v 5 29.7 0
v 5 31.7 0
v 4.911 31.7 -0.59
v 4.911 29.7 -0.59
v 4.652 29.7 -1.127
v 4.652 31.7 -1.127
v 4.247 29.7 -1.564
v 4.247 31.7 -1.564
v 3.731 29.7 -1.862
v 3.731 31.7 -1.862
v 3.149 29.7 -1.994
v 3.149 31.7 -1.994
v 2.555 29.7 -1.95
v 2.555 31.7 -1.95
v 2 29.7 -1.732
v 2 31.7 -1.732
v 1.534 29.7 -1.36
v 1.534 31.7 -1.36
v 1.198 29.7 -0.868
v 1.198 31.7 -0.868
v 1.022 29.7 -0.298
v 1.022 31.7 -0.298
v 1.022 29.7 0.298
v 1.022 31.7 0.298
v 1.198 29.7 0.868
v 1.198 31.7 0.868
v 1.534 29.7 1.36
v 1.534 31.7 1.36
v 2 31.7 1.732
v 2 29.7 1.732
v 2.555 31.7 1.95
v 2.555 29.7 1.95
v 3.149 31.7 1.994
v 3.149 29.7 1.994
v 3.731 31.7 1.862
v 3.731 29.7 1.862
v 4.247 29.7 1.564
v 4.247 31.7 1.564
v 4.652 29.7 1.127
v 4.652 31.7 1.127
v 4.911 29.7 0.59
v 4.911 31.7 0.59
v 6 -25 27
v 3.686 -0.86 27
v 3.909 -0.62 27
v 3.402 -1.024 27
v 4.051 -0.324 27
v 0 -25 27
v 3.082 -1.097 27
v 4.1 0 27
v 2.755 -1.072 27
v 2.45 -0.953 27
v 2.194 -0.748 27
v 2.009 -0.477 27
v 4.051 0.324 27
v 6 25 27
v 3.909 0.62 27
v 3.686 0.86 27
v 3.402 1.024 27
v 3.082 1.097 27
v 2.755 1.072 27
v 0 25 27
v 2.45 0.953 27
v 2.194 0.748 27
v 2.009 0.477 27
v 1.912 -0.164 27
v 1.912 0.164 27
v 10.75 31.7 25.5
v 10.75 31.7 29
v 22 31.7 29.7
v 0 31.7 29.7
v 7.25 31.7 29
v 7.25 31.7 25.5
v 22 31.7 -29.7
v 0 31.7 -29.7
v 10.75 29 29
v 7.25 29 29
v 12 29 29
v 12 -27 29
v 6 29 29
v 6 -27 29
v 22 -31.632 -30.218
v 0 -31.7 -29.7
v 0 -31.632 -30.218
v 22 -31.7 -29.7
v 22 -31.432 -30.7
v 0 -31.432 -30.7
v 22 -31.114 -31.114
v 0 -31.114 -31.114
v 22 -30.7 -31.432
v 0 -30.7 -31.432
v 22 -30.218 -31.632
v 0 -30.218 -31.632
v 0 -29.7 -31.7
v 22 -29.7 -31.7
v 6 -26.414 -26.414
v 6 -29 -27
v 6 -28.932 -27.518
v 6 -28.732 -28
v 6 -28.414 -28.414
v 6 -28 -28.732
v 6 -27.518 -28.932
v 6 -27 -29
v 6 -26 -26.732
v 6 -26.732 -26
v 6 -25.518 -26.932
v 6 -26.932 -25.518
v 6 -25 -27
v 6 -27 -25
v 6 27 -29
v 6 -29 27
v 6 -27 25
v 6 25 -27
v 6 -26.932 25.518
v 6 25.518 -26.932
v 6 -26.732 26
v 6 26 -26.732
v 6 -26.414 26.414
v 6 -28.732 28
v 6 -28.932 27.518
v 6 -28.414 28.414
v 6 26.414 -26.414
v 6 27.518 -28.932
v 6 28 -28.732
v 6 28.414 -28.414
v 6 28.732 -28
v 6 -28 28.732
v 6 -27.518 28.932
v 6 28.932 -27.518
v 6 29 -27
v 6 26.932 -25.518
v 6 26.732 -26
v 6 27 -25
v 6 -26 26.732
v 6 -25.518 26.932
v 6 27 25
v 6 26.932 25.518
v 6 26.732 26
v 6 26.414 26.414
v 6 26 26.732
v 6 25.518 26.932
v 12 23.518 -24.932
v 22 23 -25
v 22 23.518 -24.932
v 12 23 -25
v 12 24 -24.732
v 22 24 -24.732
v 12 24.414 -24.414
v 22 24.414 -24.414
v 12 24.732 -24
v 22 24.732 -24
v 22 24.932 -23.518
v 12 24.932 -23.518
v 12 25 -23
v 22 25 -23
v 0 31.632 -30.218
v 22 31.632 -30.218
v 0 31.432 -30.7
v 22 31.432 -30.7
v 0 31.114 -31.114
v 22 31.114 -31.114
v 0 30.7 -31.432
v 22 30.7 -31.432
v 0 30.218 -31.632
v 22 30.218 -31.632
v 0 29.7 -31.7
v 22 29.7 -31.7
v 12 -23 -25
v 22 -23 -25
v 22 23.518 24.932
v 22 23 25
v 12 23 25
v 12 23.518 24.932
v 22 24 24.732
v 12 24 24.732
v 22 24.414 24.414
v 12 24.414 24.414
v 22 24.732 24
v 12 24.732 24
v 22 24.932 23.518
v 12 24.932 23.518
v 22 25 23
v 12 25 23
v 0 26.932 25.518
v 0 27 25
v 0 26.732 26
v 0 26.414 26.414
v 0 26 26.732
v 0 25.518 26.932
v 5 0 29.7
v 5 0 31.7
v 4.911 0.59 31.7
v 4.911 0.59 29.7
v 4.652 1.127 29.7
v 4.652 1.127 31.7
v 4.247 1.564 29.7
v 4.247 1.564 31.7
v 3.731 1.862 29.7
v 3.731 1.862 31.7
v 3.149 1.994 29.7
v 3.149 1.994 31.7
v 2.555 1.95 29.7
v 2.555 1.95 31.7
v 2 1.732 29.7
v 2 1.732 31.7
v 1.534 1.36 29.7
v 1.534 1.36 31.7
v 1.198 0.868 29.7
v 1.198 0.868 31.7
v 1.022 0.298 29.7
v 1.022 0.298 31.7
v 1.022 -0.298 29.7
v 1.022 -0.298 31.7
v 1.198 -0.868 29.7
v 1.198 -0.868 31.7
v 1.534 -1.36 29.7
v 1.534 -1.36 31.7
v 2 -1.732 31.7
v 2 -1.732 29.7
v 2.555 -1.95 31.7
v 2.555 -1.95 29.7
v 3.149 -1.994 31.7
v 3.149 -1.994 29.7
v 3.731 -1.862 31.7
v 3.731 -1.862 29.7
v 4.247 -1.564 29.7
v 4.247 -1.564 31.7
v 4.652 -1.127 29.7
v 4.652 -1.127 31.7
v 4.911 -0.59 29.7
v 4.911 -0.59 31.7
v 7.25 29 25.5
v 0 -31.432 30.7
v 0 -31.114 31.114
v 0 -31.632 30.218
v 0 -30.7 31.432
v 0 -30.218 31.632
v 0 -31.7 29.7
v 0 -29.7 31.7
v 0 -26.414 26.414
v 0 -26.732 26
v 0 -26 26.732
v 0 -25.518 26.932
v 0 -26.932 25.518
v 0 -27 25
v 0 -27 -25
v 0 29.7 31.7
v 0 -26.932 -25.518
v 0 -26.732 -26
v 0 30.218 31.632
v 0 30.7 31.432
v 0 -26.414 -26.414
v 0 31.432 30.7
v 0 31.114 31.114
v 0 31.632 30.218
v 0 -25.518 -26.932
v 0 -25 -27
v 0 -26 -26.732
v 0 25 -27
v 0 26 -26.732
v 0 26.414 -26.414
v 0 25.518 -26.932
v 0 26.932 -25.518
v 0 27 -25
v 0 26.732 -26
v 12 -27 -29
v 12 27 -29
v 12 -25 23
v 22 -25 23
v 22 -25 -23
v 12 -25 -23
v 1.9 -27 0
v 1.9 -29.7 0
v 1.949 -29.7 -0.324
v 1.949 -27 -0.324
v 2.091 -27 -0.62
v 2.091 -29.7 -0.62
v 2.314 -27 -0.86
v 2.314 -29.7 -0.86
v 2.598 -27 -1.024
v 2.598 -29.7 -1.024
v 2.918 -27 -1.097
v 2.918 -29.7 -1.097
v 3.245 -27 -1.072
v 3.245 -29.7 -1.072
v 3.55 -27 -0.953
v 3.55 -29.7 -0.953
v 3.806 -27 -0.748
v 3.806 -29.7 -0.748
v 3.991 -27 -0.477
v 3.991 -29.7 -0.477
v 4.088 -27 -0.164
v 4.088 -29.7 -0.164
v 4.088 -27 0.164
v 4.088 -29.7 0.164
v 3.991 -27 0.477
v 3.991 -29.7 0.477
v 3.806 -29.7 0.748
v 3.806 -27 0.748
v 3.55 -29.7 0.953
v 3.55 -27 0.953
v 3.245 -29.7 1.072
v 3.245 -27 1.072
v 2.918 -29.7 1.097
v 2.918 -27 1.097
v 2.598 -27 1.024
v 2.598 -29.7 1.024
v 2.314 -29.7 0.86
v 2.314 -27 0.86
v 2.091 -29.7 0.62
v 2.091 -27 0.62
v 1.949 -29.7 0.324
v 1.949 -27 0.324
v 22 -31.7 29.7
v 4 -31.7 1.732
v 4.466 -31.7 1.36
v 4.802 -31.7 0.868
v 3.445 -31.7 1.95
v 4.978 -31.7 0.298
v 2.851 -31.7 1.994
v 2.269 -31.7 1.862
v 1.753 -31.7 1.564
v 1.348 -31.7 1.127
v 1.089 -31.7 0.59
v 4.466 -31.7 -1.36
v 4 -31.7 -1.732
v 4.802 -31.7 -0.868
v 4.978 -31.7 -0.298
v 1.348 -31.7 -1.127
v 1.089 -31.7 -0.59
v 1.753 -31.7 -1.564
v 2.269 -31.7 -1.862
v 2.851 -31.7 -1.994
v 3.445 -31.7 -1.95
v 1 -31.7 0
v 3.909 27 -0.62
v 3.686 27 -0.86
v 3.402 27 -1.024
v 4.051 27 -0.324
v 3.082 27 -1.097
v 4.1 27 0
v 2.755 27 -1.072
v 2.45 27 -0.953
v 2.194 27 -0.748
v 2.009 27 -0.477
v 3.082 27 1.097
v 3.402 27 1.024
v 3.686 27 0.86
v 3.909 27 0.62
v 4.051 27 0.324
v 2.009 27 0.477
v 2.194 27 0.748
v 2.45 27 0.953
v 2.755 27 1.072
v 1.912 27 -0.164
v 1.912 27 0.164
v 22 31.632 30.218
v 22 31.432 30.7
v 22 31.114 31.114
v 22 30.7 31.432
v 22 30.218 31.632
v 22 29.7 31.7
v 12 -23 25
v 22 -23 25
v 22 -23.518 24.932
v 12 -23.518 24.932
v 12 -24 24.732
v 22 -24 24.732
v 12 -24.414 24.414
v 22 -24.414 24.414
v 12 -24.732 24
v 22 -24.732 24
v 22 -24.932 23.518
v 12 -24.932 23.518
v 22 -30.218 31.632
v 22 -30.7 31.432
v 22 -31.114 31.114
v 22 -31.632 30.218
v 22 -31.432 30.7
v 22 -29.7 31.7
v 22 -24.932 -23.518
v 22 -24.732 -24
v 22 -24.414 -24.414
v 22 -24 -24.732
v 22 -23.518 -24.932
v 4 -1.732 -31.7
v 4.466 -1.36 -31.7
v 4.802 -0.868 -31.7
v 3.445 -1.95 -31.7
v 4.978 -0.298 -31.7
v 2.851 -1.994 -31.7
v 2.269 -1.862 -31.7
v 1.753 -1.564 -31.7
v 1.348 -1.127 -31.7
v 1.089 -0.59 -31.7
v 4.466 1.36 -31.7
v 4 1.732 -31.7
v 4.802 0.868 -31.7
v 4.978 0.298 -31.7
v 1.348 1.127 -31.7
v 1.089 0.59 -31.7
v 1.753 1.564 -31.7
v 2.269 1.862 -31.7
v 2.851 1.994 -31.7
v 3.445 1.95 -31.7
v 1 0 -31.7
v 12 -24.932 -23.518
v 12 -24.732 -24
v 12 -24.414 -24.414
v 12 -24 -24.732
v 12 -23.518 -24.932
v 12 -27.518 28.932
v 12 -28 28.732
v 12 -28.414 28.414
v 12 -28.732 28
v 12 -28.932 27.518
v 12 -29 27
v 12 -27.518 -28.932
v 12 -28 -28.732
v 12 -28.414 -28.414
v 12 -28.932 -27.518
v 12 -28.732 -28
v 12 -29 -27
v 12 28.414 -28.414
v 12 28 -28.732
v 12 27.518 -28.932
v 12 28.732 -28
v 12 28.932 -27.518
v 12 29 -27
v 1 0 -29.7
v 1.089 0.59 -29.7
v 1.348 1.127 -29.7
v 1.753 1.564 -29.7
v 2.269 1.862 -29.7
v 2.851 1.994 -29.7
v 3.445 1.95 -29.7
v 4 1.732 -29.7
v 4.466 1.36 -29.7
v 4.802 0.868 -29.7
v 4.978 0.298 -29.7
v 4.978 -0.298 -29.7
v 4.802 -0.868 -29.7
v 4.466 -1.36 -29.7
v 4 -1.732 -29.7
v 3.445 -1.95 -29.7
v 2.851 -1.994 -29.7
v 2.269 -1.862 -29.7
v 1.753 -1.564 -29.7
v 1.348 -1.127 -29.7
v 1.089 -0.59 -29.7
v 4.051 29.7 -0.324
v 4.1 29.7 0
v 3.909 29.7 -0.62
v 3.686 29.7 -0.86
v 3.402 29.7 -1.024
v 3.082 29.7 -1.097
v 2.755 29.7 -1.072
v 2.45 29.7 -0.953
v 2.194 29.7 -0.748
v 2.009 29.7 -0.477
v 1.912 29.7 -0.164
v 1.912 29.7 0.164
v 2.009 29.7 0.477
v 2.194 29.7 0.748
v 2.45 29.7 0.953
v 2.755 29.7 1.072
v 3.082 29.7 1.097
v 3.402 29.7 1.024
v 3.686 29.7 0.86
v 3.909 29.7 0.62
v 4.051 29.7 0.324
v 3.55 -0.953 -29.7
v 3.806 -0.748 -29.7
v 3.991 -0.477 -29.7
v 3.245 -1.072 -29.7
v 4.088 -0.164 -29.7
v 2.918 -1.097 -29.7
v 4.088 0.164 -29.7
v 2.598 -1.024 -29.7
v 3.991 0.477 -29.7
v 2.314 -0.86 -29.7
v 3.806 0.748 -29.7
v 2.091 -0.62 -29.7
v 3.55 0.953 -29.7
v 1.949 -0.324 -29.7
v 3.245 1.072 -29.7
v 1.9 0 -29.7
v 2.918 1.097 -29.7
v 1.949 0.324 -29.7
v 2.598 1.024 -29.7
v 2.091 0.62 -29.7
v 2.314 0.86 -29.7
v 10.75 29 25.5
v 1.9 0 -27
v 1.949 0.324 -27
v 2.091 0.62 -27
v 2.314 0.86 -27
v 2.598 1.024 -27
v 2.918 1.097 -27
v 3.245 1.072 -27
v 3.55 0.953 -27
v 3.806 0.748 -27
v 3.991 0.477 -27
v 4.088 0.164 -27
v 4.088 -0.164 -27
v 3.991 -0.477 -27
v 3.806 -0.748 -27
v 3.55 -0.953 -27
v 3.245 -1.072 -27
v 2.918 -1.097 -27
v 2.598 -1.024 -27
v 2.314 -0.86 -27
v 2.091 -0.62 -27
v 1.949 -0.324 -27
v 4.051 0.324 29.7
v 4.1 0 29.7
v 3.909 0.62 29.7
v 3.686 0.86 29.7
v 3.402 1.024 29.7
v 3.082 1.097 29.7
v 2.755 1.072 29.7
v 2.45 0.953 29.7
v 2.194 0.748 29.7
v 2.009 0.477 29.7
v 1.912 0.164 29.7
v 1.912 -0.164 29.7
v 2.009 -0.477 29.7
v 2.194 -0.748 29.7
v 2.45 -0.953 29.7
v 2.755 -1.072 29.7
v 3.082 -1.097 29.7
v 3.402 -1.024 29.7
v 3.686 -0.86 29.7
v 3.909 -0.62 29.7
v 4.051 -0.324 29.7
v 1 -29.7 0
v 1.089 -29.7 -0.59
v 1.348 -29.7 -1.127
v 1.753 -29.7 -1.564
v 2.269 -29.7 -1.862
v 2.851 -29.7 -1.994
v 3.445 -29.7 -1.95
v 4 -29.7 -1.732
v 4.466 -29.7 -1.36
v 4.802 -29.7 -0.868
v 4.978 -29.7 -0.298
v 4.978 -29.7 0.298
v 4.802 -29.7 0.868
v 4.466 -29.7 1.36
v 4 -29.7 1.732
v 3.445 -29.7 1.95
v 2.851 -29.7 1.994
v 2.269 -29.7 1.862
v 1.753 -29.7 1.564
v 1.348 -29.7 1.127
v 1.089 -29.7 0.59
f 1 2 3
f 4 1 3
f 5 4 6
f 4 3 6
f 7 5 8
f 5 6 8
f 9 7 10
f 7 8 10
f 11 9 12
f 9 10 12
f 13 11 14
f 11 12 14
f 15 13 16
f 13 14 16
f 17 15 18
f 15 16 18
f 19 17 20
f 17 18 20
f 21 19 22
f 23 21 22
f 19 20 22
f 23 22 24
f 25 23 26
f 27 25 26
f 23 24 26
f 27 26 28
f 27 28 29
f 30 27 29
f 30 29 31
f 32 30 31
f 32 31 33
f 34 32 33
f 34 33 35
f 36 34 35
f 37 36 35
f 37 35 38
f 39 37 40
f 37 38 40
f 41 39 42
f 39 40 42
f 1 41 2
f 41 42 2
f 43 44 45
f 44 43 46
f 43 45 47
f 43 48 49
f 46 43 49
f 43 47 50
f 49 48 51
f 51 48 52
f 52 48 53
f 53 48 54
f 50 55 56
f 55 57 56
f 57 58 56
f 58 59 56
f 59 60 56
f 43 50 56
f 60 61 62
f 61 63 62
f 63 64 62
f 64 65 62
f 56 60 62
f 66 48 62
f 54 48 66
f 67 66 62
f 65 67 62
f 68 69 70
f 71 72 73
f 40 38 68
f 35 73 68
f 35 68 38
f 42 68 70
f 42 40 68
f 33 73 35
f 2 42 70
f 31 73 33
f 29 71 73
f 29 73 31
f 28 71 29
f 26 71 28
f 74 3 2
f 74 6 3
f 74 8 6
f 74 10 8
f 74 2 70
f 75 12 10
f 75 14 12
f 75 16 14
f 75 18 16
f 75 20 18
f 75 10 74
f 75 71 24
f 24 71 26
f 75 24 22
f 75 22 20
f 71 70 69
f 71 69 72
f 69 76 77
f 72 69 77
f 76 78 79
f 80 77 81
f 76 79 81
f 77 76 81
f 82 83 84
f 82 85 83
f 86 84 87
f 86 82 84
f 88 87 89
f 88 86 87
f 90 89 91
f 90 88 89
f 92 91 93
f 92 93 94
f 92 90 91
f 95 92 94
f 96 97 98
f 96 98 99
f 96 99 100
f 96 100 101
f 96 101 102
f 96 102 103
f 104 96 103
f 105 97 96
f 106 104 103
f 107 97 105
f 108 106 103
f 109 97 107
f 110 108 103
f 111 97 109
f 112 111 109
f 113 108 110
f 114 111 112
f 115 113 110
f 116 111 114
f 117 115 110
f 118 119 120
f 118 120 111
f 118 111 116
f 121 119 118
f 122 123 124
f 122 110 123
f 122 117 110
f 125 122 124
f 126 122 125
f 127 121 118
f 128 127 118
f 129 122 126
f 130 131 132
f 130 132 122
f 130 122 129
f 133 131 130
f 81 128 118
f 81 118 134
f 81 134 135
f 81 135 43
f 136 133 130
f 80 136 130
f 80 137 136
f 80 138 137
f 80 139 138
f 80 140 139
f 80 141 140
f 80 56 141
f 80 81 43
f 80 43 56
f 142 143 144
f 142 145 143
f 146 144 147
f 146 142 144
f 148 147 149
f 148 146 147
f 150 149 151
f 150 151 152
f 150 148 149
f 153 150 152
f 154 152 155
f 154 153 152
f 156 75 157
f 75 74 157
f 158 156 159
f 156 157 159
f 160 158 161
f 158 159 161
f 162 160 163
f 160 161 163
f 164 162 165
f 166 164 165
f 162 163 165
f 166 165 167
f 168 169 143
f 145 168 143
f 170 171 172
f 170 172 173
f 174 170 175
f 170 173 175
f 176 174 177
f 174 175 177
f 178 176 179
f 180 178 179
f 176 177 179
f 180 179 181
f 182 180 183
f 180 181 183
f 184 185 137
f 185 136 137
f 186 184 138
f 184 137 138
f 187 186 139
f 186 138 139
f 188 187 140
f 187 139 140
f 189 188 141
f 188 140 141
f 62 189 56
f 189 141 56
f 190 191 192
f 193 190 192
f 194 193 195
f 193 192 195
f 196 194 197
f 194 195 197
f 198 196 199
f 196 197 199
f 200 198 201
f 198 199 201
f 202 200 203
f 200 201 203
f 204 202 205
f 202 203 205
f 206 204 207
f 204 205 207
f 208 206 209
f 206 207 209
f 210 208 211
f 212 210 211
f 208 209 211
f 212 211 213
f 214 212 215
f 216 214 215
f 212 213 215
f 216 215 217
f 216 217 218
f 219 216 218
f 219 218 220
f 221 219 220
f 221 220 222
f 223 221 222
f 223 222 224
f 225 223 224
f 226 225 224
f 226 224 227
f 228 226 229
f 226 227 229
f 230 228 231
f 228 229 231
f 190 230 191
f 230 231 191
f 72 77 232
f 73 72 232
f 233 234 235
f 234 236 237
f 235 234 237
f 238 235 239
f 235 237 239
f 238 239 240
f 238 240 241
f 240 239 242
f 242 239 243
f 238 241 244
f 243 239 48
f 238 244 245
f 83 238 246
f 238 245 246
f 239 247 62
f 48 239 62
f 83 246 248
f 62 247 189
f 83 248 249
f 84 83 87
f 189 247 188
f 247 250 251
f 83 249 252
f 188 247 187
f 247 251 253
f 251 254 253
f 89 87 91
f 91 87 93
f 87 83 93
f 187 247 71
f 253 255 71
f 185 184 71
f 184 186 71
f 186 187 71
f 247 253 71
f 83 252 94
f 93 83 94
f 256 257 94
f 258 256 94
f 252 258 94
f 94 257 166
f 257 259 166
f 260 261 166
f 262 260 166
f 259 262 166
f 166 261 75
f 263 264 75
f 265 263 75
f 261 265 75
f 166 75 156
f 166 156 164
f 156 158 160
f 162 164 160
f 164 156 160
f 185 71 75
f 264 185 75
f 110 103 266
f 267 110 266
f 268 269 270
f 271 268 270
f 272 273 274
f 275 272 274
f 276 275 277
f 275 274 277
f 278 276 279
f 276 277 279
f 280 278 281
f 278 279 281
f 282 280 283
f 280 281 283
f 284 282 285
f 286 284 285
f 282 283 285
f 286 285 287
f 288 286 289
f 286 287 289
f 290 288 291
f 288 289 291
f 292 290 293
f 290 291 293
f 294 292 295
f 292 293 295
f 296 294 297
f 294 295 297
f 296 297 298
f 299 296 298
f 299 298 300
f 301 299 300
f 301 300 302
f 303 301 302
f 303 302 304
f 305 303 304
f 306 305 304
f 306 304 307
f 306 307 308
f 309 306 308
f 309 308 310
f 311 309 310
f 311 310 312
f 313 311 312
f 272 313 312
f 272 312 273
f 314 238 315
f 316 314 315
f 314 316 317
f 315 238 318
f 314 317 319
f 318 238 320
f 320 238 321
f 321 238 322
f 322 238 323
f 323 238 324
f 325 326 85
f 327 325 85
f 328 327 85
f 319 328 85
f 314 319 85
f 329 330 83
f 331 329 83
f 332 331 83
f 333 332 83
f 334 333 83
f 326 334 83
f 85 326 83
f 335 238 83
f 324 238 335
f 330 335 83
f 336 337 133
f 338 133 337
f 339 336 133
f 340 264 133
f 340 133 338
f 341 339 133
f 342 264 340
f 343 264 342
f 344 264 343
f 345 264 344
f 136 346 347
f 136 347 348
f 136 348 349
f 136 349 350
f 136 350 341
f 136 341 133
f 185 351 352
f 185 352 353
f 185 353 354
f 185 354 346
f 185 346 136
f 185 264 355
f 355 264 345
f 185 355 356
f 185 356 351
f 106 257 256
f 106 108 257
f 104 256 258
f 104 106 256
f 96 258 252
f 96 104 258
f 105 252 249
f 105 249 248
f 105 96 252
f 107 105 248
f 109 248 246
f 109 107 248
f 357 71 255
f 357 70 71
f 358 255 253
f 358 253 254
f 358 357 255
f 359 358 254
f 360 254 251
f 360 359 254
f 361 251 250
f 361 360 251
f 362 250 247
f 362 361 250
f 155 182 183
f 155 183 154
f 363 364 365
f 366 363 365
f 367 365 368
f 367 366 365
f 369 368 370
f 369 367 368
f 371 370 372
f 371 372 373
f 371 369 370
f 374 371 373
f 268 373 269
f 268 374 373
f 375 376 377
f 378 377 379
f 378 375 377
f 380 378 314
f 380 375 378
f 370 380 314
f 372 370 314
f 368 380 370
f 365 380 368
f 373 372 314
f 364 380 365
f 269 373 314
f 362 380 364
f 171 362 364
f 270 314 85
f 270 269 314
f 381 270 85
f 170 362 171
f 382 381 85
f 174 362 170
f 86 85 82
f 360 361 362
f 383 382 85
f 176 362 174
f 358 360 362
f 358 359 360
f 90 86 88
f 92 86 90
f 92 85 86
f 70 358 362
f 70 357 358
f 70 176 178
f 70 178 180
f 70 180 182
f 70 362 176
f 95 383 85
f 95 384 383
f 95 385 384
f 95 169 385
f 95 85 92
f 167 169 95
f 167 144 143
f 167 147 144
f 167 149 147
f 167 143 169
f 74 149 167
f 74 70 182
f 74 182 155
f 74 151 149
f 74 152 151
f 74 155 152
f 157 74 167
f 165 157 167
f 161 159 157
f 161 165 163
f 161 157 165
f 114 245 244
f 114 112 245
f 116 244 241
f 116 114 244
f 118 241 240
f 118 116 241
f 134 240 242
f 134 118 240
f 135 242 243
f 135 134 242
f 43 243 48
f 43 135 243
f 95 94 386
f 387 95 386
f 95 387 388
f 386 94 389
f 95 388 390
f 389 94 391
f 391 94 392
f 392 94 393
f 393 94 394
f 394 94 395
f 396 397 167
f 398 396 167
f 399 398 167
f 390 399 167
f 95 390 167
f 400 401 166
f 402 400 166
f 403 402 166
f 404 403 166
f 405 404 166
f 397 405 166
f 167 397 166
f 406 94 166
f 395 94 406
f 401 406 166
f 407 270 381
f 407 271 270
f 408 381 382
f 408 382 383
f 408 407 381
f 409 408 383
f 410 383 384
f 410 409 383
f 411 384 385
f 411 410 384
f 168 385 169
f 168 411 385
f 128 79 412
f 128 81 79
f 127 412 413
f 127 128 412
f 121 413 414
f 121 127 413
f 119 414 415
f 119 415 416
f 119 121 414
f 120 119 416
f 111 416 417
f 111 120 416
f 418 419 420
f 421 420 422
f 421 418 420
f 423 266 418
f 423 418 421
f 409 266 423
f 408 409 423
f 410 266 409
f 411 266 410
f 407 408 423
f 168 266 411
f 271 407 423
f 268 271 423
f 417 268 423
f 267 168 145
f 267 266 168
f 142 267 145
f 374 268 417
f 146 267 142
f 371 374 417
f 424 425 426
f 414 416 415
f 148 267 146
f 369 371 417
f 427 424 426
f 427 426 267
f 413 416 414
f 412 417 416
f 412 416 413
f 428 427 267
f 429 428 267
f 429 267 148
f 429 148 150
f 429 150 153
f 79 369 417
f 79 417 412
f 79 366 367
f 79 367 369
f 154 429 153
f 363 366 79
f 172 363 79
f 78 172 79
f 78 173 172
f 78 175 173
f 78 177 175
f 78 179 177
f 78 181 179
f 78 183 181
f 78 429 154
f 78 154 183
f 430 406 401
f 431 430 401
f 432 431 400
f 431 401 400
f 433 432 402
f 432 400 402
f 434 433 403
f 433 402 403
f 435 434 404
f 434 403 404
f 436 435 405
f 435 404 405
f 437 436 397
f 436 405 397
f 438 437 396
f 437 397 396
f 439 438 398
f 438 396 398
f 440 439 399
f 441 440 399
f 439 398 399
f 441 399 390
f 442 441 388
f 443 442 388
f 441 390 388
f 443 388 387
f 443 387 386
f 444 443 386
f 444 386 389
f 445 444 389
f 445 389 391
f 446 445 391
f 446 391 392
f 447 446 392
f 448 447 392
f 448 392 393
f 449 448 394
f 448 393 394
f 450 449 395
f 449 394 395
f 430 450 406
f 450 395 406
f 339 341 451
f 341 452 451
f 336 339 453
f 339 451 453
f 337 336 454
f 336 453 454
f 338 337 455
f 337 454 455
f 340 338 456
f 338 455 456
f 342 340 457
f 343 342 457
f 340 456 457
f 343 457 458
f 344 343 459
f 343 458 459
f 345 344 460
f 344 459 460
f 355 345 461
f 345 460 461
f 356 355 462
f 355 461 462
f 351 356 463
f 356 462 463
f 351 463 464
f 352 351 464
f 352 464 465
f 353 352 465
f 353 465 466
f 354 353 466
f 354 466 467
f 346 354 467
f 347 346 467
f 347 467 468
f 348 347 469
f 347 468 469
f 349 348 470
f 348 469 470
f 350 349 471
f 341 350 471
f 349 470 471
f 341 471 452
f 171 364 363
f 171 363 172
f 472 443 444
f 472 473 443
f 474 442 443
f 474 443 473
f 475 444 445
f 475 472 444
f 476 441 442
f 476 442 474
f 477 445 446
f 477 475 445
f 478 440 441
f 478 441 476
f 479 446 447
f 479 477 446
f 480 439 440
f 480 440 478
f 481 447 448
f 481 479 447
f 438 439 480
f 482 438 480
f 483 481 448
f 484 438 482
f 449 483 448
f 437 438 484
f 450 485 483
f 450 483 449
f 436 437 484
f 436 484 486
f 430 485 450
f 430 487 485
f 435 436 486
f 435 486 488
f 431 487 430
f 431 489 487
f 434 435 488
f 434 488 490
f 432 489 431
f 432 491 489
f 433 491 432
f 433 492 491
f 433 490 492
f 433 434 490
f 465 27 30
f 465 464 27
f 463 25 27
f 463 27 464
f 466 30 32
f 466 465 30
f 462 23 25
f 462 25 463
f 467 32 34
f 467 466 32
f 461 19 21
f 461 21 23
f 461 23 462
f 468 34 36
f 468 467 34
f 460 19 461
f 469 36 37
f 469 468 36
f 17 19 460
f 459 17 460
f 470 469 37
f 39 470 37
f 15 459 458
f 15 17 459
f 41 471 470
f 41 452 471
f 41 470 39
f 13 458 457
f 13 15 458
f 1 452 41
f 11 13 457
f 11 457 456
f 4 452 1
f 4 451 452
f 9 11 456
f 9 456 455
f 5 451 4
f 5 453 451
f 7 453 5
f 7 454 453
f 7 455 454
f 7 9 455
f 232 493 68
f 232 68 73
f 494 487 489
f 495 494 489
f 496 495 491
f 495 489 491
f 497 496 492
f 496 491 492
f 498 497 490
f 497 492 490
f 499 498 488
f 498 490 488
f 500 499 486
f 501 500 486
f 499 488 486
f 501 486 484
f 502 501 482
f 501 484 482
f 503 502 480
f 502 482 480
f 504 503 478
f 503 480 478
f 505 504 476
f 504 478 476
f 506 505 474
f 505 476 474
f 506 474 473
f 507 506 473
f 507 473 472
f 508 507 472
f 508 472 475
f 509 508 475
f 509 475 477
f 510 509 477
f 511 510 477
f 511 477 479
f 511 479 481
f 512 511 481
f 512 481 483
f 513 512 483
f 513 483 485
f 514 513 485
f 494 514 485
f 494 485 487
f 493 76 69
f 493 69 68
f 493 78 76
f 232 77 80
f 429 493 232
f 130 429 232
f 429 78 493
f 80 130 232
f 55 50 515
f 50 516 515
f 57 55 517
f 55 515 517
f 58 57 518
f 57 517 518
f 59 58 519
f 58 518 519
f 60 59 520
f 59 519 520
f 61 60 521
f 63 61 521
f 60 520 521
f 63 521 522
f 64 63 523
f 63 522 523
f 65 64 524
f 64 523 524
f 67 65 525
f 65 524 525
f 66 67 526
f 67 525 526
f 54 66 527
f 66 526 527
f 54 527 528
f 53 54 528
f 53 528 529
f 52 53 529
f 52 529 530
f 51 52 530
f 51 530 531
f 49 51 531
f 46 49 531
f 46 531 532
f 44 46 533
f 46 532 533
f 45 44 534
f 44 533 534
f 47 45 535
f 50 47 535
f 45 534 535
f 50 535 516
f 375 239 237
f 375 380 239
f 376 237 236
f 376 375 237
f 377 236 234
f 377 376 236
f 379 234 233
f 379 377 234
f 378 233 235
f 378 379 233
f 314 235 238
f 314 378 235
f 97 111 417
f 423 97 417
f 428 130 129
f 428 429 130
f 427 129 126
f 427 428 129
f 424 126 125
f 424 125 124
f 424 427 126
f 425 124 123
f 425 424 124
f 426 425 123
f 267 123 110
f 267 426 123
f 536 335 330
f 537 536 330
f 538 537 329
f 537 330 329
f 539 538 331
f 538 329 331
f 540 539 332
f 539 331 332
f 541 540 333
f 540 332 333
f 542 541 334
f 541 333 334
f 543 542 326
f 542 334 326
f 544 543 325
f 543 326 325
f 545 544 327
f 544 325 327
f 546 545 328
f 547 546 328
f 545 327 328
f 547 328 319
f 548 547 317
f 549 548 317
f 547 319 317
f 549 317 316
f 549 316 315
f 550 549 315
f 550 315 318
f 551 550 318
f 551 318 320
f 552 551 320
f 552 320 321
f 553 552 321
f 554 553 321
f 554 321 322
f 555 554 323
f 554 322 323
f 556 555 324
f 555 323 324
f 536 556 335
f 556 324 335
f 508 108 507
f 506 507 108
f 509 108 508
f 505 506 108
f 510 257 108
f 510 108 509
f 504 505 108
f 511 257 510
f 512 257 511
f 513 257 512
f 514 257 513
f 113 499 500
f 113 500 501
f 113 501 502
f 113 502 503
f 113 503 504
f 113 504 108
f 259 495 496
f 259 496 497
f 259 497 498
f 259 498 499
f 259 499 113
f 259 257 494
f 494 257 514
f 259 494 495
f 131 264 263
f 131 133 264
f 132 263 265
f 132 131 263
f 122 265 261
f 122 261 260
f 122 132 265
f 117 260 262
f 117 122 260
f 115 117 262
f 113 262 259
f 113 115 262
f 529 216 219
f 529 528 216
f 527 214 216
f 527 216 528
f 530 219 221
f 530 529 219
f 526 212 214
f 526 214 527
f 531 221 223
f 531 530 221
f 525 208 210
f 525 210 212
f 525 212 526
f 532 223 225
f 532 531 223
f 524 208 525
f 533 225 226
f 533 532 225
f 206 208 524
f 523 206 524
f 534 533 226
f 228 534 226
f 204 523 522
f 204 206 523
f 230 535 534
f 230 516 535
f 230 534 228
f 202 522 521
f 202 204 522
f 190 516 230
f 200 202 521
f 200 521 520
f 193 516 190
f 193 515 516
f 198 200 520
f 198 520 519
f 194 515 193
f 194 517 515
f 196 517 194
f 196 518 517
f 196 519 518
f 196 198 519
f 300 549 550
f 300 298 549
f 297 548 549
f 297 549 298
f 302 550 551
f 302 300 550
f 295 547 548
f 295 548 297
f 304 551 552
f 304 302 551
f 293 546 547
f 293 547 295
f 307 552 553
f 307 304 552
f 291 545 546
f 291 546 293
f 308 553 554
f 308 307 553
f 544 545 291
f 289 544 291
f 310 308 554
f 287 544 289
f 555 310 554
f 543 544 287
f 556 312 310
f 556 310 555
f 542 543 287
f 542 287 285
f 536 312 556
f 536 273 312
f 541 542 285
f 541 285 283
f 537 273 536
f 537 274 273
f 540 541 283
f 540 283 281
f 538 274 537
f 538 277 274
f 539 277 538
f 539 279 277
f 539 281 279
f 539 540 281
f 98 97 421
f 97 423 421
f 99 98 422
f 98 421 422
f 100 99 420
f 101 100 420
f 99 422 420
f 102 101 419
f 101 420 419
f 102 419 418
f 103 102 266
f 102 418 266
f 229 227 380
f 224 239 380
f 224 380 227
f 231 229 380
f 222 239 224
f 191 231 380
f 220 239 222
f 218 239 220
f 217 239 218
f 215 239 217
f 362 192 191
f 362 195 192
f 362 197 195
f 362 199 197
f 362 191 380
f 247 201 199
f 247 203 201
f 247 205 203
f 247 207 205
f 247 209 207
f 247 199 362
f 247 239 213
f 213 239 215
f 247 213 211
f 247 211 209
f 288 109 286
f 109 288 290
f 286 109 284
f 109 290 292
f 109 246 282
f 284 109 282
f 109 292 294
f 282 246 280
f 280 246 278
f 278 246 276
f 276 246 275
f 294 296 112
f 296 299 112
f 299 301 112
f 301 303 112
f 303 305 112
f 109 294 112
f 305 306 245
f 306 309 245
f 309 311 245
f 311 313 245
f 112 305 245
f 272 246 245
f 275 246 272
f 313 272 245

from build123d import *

# Parameters (mm, degrees)
SKETCH_1_W           = 63.4
SKETCH_1_H           = 63.4
EXTRUDE_1_DEPTH      = 22
SKETCH_2_W           = 50
SKETCH_2_H           = 50
CUT_EXTRUDE_1_DEPTH  = 10
SKETCH_3_W           = 54
SKETCH_3_H           = 54
CUT_EXTRUDE_2_DEPTH  = 12
SKETCH_4_W           = 6
SKETCH_4_H           = 54
CUT_EXTRUDE_3_DEPTH  = 2
SKETCH_5_W           = 6
SKETCH_5_H           = 56
CUT_EXTRUDE_4_DEPTH  = 2
SKETCH_6_W           = 6
SKETCH_6_H           = 56
CUT_EXTRUDE_5_DEPTH  = 2
SKETCH_8_W           = 6
SKETCH_8_H           = 58
CUT_EXTRUDE_9_DEPTH  = 2
CUT_EXTRUDE_11_REACH = 4.7
SKETCH_9_W           = 3.5
SKETCH_9_H           = 3.5
SKETCH_10_R          = 2
CUT_EXTRUDE_12_DEPTH = 2
CUT_EXTRUDE_13_REACH = 63.4
SKETCH_11_R          = 1.1
SKETCH_12_R          = 2
CUT_EXTRUDE_14_DEPTH = 2
CUT_EXTRUDE_15_REACH = 65.4
SKETCH_13_R          = 1.1
SKETCH_14_R          = 2
CUT_EXTRUDE_16_DEPTH = 2
CUT_EXTRUDE_17_REACH = 63.4
SKETCH_15_R          = 1.1
SKETCH_16_R          = 2
CUT_EXTRUDE_18_DEPTH = 2
CUT_EXTRUDE_19_REACH = 63.4
SKETCH_17_R          = 1.1
FILLET_1_R           = 2
FILLET_2_R           = 2
FILLET_3_R           = 2
FILLET_4_R           = 2


with BuildPart() as part:
    # 草图1 → 凸台-拉伸1 (new body)
    with BuildSketch(Plane(origin=(0, 0, 0), x_dir=(0, 0, -1), z_dir=(1, 0, 0))):
        Rectangle(SKETCH_1_W, SKETCH_1_H)
    extrude(amount=EXTRUDE_1_DEPTH)

    # 草图2 → 切除-拉伸1 (cut)
    with BuildSketch(Plane(origin=(22, 0, 0), x_dir=(0, 0, -1), z_dir=(1, 0, 0))):
        Rectangle(SKETCH_2_W, SKETCH_2_H)
    extrude(amount=-CUT_EXTRUDE_1_DEPTH, mode=Mode.SUBTRACT)

    # 草图3 → 切除-拉伸2 (cut)
    with BuildSketch(Plane.ZY):
        Rectangle(SKETCH_3_W, SKETCH_3_H)
    extrude(amount=-CUT_EXTRUDE_2_DEPTH, mode=Mode.SUBTRACT)

    # 草图4 → 切除-拉伸3 (cut)
    with BuildSketch(Plane(origin=(0, 27, 0), x_dir=(-1, 0, 0), z_dir=(0, -1, 0))):
        with Locations((-9, 0)):
            Rectangle(SKETCH_4_W, SKETCH_4_H)
    extrude(amount=-CUT_EXTRUDE_3_DEPTH, mode=Mode.SUBTRACT)

    # 草图5 → 切除-拉伸4 (cut)
    with BuildSketch(Plane.XY.offset(-27)):
        with Locations((9, 1)):
            Rectangle(SKETCH_5_W, SKETCH_5_H)
    extrude(amount=-CUT_EXTRUDE_4_DEPTH, mode=Mode.SUBTRACT)

    # 草图6 → 切除-拉伸5 (cut)
    with BuildSketch(Plane(origin=(0, -27, 0), x_dir=(1, 0, 0), z_dir=(0, 1, 0))):
        with Locations((9, 1)):
            Rectangle(SKETCH_6_W, SKETCH_6_H)
    extrude(amount=-CUT_EXTRUDE_5_DEPTH, mode=Mode.SUBTRACT)

    # 草图8 → 切除-拉伸9 (cut)
    with BuildSketch(Plane(origin=(0, 0, 27), x_dir=(-1, 0, 0), z_dir=(0, 0, -1))):
        with Locations((-9, 0)):
            Rectangle(SKETCH_8_W, SKETCH_8_H)
    extrude(amount=-CUT_EXTRUDE_9_DEPTH, mode=Mode.SUBTRACT)

    # 草图9 → 切除-拉伸11 (cut, up to next)
    with BuildSketch(Plane(origin=(0, 29, 0), x_dir=(-1, 0, 0), z_dir=(0, -1, 0)), mode=Mode.PRIVATE) as cut_extrude_11_sk1:
        with Locations((-9, -27.25)):
            Rectangle(SKETCH_9_W, SKETCH_9_H)
    cut_extrude_11_tool1 = extrude(cut_extrude_11_sk1.sketch, amount=-CUT_EXTRUDE_11_REACH, mode=Mode.PRIVATE) & part.part
    add(cut_extrude_11_tool1.solids().sort_by_distance((9, 29, 27.25))[0], mode=Mode.SUBTRACT)

    # 草图10 → 切除-拉伸12 (cut)
    with BuildSketch(Plane(origin=(0, 0, -31.7), x_dir=(-1, 0, 0), z_dir=(0, 0, -1))):
        with Locations((-3, 0)):
            Circle(SKETCH_10_R)
    extrude(amount=-CUT_EXTRUDE_12_DEPTH, mode=Mode.SUBTRACT)

    # 草图11 → 切除-拉伸13 (cut, up to next)
    with BuildSketch(Plane(origin=(0, 0, -29.7), x_dir=(-1, 0, 0), z_dir=(0, 0, -1)), mode=Mode.PRIVATE) as cut_extrude_13_sk1:
        with Locations((-3, 0)):
            Circle(SKETCH_11_R)
    cut_extrude_13_tool1 = extrude(cut_extrude_13_sk1.sketch, amount=-CUT_EXTRUDE_13_REACH, mode=Mode.PRIVATE) & part.part
    add(cut_extrude_13_tool1.solids().sort_by_distance((3, 0, -29.7))[0], mode=Mode.SUBTRACT)

    # 草图12 → 切除-拉伸14 (cut)
    with BuildSketch(Plane.XY.offset(31.7)):
        with Locations((3, 0)):
            Circle(SKETCH_12_R)
    extrude(amount=-CUT_EXTRUDE_14_DEPTH, mode=Mode.SUBTRACT)

    # 草图13 → 切除-拉伸15 (cut, up to next)
    with BuildSketch(Plane.XY.offset(31.7), mode=Mode.PRIVATE) as cut_extrude_15_sk1:
        with Locations((3, 0)):
            Circle(SKETCH_13_R)
    cut_extrude_15_tool1 = extrude(cut_extrude_15_sk1.sketch, amount=-CUT_EXTRUDE_15_REACH, mode=Mode.PRIVATE) & part.part
    add(cut_extrude_15_tool1.solids().sort_by_distance((3, 0, 31.7))[0], mode=Mode.SUBTRACT)

    # 草图14 → 切除-拉伸16 (cut)
    with BuildSketch(Plane(origin=(0, -31.7, 0), x_dir=(-1, 0, 0), z_dir=(0, -1, 0))):
        with Locations((-3, 0)):
            Circle(SKETCH_14_R)
    extrude(amount=-CUT_EXTRUDE_16_DEPTH, mode=Mode.SUBTRACT)

    # 草图15 → 切除-拉伸17 (cut, up to next)
    with BuildSketch(Plane(origin=(0, -29.7, 0), x_dir=(-1, 0, 0), z_dir=(0, -1, 0)), mode=Mode.PRIVATE) as cut_extrude_17_sk1:
        with Locations((-3, 0)):
            Circle(SKETCH_15_R)
    cut_extrude_17_tool1 = extrude(cut_extrude_17_sk1.sketch, amount=-CUT_EXTRUDE_17_REACH, mode=Mode.PRIVATE) & part.part
    add(cut_extrude_17_tool1.solids().sort_by_distance((3, -29.7, 0))[0], mode=Mode.SUBTRACT)

    # 草图16 → 切除-拉伸18 (cut)
    with BuildSketch(Plane(origin=(0, 31.7, 0), x_dir=(1, 0, 0), z_dir=(0, 1, 0))):
        with Locations((3, 0)):
            Circle(SKETCH_16_R)
    extrude(amount=-CUT_EXTRUDE_18_DEPTH, mode=Mode.SUBTRACT)

    # 草图17 → 切除-拉伸19 (cut, up to next)
    with BuildSketch(Plane(origin=(0, 29.7, 0), x_dir=(1, 0, 0), z_dir=(0, 1, 0)), mode=Mode.PRIVATE) as cut_extrude_19_sk1:
        with Locations((3, 0)):
            Circle(SKETCH_17_R)
    cut_extrude_19_tool1 = extrude(cut_extrude_19_sk1.sketch, amount=-CUT_EXTRUDE_19_REACH, mode=Mode.PRIVATE) & part.part
    add(cut_extrude_19_tool1.solids().sort_by_distance((3, 29.7, 0))[0], mode=Mode.SUBTRACT)

    # 圆角1
    fillet_1_edges = [part.edges().sort_by_distance(p)[0] for p in [
        (9, -29, -29),
        (9, -29, 29),
        (9, 29, -29),
    ]]
    fillet(fillet_1_edges, radius=FILLET_1_R)

    # 圆角2
    fillet_2_edges = [part.edges().sort_by_distance(p)[0] for p in [
        (17, 25, -25),
        (17, -25, -25),
        (17, -25, 25),
        (17, 25, 25),
    ]]
    fillet(fillet_2_edges, radius=FILLET_2_R)

    # 圆角3
    fillet_3_edges = [part.edges().sort_by_distance(p)[0] for p in [
        (3, 27, -27),
        (3, 27, 27),
        (3, -27, -27),
        (3, -27, 27),
    ]]
    fillet(fillet_3_edges, radius=FILLET_3_R)

    # 圆角4
    fillet_4_edges = [part.edges().sort_by_distance(p)[0] for p in [
        (11, -31.7, -31.7),
        (11, -31.7, 31.7),
        (11, 31.7, 31.7),
        (11, 31.7, -31.7),
    ]]
    fillet(fillet_4_edges, radius=FILLET_4_R)


solid = part.part
